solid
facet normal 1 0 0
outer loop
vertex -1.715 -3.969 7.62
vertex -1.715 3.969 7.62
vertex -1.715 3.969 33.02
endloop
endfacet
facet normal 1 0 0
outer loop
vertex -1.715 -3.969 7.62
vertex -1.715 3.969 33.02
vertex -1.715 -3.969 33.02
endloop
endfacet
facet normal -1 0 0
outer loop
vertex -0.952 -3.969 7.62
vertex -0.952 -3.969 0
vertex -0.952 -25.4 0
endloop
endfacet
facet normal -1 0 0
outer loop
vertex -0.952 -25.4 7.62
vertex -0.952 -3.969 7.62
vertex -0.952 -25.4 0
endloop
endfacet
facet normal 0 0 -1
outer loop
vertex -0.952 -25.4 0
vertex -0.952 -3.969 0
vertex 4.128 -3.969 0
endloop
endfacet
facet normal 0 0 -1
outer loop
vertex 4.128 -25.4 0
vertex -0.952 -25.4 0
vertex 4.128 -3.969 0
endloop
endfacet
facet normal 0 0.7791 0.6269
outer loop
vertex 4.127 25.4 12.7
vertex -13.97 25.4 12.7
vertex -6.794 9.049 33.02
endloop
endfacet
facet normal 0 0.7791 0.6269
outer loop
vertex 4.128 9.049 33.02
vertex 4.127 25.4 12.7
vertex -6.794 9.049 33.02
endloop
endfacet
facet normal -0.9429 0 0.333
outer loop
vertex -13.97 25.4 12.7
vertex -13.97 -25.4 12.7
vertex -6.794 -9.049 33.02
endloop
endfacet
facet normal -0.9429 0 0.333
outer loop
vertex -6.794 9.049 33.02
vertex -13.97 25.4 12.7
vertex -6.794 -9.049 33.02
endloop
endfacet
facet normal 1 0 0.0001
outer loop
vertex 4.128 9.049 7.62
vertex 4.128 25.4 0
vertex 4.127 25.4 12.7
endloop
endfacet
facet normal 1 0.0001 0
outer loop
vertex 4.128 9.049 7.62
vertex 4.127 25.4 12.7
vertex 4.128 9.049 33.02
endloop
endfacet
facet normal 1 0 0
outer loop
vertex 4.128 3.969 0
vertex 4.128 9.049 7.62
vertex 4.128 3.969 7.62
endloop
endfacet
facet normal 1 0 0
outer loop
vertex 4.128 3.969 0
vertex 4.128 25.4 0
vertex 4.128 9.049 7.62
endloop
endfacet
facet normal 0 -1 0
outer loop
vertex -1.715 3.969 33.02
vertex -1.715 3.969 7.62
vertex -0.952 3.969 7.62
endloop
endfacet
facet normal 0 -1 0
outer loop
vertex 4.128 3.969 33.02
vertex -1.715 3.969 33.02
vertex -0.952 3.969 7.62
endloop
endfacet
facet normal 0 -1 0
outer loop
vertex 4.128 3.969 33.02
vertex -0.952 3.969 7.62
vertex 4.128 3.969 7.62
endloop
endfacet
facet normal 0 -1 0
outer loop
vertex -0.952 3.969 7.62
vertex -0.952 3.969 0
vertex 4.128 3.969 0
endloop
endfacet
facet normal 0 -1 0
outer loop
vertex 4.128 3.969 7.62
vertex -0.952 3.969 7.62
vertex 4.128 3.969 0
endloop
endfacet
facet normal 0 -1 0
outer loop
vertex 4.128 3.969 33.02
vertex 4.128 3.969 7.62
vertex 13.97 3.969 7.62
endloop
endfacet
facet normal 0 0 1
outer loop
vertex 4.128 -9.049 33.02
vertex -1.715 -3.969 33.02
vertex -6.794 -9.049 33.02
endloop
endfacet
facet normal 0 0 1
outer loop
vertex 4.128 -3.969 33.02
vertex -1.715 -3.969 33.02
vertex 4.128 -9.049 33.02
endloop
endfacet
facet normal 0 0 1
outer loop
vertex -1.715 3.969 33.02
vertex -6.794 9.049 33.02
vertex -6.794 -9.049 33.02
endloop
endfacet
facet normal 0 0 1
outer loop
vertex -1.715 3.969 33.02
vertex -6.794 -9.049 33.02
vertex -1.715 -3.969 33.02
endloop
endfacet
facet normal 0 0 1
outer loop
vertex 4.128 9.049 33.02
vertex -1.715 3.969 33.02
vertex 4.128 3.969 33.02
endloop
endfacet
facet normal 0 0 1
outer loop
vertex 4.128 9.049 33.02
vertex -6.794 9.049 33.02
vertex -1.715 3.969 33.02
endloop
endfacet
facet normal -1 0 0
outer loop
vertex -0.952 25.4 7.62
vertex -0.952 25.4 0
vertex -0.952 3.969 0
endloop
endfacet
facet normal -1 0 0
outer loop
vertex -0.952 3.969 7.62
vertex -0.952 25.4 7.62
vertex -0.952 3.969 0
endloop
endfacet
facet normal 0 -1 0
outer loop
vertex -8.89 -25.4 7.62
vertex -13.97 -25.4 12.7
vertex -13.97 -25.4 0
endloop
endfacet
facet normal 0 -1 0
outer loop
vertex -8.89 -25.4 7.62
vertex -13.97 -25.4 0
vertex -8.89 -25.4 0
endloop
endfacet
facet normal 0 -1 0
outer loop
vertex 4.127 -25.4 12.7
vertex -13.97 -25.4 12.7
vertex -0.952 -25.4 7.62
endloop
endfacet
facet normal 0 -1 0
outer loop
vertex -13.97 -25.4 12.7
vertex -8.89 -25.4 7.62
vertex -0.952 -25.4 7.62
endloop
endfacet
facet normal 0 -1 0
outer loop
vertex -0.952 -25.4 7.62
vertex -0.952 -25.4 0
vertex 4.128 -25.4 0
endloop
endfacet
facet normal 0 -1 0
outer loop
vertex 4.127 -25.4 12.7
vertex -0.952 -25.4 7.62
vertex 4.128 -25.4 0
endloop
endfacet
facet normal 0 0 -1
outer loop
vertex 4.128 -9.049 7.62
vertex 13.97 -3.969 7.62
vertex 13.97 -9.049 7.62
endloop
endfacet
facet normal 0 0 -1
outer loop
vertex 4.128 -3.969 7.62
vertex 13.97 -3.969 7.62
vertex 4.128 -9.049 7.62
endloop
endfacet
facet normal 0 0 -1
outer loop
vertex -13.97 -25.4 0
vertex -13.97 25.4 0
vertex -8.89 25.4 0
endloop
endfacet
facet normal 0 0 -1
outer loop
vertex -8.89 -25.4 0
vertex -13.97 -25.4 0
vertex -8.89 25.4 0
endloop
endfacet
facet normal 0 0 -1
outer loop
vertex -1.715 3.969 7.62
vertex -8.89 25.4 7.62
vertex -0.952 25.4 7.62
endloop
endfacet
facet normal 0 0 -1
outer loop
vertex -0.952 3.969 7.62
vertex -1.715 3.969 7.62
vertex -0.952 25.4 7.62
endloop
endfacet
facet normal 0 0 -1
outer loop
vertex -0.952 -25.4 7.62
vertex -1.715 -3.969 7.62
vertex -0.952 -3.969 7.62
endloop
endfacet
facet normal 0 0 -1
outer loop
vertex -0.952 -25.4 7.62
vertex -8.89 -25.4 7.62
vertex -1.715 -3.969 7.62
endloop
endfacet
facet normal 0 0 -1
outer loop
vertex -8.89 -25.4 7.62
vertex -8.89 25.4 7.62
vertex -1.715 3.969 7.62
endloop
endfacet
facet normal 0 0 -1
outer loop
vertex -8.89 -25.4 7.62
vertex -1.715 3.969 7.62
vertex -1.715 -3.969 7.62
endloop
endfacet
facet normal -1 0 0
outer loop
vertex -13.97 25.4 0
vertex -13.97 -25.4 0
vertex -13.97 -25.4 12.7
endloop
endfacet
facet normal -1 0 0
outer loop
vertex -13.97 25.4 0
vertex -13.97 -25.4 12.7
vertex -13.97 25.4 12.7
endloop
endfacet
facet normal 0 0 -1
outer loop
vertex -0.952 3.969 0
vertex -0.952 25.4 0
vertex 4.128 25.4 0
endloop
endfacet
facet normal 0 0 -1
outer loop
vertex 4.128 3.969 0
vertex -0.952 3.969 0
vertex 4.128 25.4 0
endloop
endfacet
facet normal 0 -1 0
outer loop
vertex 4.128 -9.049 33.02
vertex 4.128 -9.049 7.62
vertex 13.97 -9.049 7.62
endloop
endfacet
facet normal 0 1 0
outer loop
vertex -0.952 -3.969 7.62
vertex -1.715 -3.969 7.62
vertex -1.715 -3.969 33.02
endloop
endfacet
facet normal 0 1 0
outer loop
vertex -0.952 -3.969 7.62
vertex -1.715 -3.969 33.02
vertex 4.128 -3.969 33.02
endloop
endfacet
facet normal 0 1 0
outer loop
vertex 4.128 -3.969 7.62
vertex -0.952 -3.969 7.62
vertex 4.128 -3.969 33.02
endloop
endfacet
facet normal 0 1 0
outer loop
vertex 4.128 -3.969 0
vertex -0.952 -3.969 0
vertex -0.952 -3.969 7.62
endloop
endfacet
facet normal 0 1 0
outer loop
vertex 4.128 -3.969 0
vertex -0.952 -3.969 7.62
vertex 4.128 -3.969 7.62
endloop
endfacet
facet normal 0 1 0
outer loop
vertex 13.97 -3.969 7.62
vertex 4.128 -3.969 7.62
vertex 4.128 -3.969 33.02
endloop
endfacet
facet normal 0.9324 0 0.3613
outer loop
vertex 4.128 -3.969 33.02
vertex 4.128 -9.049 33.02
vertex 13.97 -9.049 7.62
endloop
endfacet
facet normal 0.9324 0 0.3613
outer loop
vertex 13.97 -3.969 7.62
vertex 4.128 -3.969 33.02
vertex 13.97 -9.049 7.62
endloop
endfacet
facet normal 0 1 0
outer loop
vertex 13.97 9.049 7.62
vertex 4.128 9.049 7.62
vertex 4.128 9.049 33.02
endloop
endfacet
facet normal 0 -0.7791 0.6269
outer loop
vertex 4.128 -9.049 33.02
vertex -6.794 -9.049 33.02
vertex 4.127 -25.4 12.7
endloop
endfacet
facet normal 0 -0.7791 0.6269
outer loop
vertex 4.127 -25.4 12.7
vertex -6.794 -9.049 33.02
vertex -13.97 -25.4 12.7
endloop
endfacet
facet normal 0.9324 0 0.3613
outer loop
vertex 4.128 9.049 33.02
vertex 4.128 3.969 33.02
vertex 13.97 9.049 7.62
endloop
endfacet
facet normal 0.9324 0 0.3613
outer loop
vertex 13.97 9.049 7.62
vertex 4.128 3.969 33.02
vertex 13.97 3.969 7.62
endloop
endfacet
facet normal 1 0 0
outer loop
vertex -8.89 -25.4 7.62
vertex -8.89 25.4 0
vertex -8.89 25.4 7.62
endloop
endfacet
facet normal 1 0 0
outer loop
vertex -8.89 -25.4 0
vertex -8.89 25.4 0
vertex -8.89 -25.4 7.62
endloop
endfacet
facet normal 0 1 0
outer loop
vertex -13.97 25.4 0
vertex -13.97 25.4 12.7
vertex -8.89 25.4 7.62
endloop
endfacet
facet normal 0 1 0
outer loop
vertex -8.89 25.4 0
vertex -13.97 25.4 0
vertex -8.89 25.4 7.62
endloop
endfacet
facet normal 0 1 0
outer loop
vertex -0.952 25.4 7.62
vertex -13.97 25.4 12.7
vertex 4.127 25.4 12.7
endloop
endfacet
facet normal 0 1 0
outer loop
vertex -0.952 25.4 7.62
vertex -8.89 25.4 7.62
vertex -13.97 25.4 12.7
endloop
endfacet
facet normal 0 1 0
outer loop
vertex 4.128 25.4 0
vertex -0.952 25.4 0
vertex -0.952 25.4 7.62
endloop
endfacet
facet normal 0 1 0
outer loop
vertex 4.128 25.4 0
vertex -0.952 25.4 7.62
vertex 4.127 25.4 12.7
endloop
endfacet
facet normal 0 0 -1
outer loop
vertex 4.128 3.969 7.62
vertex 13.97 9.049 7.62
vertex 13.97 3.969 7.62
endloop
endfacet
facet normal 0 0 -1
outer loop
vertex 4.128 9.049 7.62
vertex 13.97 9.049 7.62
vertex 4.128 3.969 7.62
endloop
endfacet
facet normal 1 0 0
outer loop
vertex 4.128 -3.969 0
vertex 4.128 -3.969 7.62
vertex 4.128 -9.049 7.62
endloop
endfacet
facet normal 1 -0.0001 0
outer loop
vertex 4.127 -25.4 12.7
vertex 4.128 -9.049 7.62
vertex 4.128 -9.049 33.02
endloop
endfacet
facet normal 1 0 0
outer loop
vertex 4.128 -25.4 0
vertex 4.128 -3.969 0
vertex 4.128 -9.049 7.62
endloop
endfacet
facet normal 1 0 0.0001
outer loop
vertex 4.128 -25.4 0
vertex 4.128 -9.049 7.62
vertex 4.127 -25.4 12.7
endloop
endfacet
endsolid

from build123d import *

# Parameters (mm, degrees)
F0_W           = 27.94
F0_H           = 50.8
F1_DEPTH       = 33.02
F2_W           = 7.9375
F2_H           = 50.8
F3_DEPTH       = 7.62
F4_W           = 15.875
F4_H           = 7.9375
F5_DEPTH       = 7.62
F6_W           = 15.6845
F6_H           = 7.9375
F7_DEPTH       = 25.4
F8_W           = 9.8425
F8_H           = 16.35125
F9_DEPTH       = 33.02
F11_DEPTH      = 27.941
F13_DEPTH      = 25.401
F13_DEPTH_BACK = 25.4
F14_W          = 9.8425
F14_H          = 7.62
F15_DEPTH      = 34.44975
F17_DEPTH      = 34.44975


with BuildPart() as f1:
    # F0 (on Top) → F1 (new body)
    with BuildSketch(Plane.XY):
        Rectangle(F0_W, F0_H)
    extrude(amount=F1_DEPTH)

    # F2 (on face) → F3 (cut)
    with BuildSketch(Plane(origin=(0, 0, 0), x_dir=(1, 0, 0), z_dir=(0, 0, -1))):
        with Locations((-4.92125, 0)):
            Rectangle(F2_W, F2_H)
    extrude(amount=-F3_DEPTH, mode=Mode.SUBTRACT)

    # F4 (on face) → F5 (cut, through all)
    with BuildSketch(Plane(origin=(0, 0, 0), x_dir=(1, 0, 0), z_dir=(0, 0, -1))):
        with Locations((6.985, 0)):
            Rectangle(F4_W, F4_H)
    extrude(amount=-F5_DEPTH, mode=Mode.SUBTRACT)

    # F6 (on face) → F7 (cut, through all)
    with BuildSketch(Plane(origin=(0, 0, 7.62), x_dir=(1, 0, 0), z_dir=(0, 0, -1))):
        with Locations((6.12775, 0)):
            Rectangle(F6_W, F6_H)
    extrude(amount=-F7_DEPTH, mode=Mode.SUBTRACT)

    # F8 (on face) → F9 (cut, through all)
    with BuildSketch(Plane(origin=(0, 0, 0), x_dir=(1, 0, 0), z_dir=(0, 0, -1))):
        with Locations((9.04875, -17.224375)):
            Rectangle(F8_W, F8_H)
        with Locations((9.04875, 17.224375)):
            Rectangle(F8_W, F8_H)
    extrude(amount=-F9_DEPTH, mode=Mode.SUBTRACT)

    # F10 (on face) → F11 (cut, through all)
    with BuildSketch(Plane(origin=(-13.97, 0, 0), x_dir=(0, -1, 0), z_dir=(-1, 0, 0))):
        Polygon((-25.4, 12.7), (-9.04875, 33.02), (-25.4, 33.02), align=None)
        Polygon((25.4, 33.02), (9.04875, 33.02), (25.4, 12.7), align=None)
    extrude(amount=-F11_DEPTH, mode=Mode.SUBTRACT)

    # F12 (on Front) → F13 (cut, two sides)
    with BuildSketch(Plane.XZ) as f13_sk:
        Polygon((-6.7945, 33.02), (-13.97, 33.02), (-13.97, 12.7), align=None)
    extrude(amount=-F13_DEPTH, mode=Mode.SUBTRACT)
    extrude(f13_sk.sketch, amount=F13_DEPTH_BACK, mode=Mode.SUBTRACT)

    # F14 (on face) → F15 (cut, through all)
    with BuildSketch(Plane(origin=(0, 9.04875, 0), x_dir=(-1, 0, 0), z_dir=(0, 1, 0))):
        with Locations((-9.04875, 3.81)):
            Rectangle(F14_W, F14_H)
    extrude(amount=-F15_DEPTH, mode=Mode.SUBTRACT)

    # F16 (on face) → F17 (cut, through all)
    with BuildSketch(Plane.XZ.offset(9.04875)):
        Polygon((13.97, 33.02), (4.1275, 33.02), (13.97, 7.62), align=None)
    extrude(amount=-F17_DEPTH, mode=Mode.SUBTRACT)


solid = f1.part
